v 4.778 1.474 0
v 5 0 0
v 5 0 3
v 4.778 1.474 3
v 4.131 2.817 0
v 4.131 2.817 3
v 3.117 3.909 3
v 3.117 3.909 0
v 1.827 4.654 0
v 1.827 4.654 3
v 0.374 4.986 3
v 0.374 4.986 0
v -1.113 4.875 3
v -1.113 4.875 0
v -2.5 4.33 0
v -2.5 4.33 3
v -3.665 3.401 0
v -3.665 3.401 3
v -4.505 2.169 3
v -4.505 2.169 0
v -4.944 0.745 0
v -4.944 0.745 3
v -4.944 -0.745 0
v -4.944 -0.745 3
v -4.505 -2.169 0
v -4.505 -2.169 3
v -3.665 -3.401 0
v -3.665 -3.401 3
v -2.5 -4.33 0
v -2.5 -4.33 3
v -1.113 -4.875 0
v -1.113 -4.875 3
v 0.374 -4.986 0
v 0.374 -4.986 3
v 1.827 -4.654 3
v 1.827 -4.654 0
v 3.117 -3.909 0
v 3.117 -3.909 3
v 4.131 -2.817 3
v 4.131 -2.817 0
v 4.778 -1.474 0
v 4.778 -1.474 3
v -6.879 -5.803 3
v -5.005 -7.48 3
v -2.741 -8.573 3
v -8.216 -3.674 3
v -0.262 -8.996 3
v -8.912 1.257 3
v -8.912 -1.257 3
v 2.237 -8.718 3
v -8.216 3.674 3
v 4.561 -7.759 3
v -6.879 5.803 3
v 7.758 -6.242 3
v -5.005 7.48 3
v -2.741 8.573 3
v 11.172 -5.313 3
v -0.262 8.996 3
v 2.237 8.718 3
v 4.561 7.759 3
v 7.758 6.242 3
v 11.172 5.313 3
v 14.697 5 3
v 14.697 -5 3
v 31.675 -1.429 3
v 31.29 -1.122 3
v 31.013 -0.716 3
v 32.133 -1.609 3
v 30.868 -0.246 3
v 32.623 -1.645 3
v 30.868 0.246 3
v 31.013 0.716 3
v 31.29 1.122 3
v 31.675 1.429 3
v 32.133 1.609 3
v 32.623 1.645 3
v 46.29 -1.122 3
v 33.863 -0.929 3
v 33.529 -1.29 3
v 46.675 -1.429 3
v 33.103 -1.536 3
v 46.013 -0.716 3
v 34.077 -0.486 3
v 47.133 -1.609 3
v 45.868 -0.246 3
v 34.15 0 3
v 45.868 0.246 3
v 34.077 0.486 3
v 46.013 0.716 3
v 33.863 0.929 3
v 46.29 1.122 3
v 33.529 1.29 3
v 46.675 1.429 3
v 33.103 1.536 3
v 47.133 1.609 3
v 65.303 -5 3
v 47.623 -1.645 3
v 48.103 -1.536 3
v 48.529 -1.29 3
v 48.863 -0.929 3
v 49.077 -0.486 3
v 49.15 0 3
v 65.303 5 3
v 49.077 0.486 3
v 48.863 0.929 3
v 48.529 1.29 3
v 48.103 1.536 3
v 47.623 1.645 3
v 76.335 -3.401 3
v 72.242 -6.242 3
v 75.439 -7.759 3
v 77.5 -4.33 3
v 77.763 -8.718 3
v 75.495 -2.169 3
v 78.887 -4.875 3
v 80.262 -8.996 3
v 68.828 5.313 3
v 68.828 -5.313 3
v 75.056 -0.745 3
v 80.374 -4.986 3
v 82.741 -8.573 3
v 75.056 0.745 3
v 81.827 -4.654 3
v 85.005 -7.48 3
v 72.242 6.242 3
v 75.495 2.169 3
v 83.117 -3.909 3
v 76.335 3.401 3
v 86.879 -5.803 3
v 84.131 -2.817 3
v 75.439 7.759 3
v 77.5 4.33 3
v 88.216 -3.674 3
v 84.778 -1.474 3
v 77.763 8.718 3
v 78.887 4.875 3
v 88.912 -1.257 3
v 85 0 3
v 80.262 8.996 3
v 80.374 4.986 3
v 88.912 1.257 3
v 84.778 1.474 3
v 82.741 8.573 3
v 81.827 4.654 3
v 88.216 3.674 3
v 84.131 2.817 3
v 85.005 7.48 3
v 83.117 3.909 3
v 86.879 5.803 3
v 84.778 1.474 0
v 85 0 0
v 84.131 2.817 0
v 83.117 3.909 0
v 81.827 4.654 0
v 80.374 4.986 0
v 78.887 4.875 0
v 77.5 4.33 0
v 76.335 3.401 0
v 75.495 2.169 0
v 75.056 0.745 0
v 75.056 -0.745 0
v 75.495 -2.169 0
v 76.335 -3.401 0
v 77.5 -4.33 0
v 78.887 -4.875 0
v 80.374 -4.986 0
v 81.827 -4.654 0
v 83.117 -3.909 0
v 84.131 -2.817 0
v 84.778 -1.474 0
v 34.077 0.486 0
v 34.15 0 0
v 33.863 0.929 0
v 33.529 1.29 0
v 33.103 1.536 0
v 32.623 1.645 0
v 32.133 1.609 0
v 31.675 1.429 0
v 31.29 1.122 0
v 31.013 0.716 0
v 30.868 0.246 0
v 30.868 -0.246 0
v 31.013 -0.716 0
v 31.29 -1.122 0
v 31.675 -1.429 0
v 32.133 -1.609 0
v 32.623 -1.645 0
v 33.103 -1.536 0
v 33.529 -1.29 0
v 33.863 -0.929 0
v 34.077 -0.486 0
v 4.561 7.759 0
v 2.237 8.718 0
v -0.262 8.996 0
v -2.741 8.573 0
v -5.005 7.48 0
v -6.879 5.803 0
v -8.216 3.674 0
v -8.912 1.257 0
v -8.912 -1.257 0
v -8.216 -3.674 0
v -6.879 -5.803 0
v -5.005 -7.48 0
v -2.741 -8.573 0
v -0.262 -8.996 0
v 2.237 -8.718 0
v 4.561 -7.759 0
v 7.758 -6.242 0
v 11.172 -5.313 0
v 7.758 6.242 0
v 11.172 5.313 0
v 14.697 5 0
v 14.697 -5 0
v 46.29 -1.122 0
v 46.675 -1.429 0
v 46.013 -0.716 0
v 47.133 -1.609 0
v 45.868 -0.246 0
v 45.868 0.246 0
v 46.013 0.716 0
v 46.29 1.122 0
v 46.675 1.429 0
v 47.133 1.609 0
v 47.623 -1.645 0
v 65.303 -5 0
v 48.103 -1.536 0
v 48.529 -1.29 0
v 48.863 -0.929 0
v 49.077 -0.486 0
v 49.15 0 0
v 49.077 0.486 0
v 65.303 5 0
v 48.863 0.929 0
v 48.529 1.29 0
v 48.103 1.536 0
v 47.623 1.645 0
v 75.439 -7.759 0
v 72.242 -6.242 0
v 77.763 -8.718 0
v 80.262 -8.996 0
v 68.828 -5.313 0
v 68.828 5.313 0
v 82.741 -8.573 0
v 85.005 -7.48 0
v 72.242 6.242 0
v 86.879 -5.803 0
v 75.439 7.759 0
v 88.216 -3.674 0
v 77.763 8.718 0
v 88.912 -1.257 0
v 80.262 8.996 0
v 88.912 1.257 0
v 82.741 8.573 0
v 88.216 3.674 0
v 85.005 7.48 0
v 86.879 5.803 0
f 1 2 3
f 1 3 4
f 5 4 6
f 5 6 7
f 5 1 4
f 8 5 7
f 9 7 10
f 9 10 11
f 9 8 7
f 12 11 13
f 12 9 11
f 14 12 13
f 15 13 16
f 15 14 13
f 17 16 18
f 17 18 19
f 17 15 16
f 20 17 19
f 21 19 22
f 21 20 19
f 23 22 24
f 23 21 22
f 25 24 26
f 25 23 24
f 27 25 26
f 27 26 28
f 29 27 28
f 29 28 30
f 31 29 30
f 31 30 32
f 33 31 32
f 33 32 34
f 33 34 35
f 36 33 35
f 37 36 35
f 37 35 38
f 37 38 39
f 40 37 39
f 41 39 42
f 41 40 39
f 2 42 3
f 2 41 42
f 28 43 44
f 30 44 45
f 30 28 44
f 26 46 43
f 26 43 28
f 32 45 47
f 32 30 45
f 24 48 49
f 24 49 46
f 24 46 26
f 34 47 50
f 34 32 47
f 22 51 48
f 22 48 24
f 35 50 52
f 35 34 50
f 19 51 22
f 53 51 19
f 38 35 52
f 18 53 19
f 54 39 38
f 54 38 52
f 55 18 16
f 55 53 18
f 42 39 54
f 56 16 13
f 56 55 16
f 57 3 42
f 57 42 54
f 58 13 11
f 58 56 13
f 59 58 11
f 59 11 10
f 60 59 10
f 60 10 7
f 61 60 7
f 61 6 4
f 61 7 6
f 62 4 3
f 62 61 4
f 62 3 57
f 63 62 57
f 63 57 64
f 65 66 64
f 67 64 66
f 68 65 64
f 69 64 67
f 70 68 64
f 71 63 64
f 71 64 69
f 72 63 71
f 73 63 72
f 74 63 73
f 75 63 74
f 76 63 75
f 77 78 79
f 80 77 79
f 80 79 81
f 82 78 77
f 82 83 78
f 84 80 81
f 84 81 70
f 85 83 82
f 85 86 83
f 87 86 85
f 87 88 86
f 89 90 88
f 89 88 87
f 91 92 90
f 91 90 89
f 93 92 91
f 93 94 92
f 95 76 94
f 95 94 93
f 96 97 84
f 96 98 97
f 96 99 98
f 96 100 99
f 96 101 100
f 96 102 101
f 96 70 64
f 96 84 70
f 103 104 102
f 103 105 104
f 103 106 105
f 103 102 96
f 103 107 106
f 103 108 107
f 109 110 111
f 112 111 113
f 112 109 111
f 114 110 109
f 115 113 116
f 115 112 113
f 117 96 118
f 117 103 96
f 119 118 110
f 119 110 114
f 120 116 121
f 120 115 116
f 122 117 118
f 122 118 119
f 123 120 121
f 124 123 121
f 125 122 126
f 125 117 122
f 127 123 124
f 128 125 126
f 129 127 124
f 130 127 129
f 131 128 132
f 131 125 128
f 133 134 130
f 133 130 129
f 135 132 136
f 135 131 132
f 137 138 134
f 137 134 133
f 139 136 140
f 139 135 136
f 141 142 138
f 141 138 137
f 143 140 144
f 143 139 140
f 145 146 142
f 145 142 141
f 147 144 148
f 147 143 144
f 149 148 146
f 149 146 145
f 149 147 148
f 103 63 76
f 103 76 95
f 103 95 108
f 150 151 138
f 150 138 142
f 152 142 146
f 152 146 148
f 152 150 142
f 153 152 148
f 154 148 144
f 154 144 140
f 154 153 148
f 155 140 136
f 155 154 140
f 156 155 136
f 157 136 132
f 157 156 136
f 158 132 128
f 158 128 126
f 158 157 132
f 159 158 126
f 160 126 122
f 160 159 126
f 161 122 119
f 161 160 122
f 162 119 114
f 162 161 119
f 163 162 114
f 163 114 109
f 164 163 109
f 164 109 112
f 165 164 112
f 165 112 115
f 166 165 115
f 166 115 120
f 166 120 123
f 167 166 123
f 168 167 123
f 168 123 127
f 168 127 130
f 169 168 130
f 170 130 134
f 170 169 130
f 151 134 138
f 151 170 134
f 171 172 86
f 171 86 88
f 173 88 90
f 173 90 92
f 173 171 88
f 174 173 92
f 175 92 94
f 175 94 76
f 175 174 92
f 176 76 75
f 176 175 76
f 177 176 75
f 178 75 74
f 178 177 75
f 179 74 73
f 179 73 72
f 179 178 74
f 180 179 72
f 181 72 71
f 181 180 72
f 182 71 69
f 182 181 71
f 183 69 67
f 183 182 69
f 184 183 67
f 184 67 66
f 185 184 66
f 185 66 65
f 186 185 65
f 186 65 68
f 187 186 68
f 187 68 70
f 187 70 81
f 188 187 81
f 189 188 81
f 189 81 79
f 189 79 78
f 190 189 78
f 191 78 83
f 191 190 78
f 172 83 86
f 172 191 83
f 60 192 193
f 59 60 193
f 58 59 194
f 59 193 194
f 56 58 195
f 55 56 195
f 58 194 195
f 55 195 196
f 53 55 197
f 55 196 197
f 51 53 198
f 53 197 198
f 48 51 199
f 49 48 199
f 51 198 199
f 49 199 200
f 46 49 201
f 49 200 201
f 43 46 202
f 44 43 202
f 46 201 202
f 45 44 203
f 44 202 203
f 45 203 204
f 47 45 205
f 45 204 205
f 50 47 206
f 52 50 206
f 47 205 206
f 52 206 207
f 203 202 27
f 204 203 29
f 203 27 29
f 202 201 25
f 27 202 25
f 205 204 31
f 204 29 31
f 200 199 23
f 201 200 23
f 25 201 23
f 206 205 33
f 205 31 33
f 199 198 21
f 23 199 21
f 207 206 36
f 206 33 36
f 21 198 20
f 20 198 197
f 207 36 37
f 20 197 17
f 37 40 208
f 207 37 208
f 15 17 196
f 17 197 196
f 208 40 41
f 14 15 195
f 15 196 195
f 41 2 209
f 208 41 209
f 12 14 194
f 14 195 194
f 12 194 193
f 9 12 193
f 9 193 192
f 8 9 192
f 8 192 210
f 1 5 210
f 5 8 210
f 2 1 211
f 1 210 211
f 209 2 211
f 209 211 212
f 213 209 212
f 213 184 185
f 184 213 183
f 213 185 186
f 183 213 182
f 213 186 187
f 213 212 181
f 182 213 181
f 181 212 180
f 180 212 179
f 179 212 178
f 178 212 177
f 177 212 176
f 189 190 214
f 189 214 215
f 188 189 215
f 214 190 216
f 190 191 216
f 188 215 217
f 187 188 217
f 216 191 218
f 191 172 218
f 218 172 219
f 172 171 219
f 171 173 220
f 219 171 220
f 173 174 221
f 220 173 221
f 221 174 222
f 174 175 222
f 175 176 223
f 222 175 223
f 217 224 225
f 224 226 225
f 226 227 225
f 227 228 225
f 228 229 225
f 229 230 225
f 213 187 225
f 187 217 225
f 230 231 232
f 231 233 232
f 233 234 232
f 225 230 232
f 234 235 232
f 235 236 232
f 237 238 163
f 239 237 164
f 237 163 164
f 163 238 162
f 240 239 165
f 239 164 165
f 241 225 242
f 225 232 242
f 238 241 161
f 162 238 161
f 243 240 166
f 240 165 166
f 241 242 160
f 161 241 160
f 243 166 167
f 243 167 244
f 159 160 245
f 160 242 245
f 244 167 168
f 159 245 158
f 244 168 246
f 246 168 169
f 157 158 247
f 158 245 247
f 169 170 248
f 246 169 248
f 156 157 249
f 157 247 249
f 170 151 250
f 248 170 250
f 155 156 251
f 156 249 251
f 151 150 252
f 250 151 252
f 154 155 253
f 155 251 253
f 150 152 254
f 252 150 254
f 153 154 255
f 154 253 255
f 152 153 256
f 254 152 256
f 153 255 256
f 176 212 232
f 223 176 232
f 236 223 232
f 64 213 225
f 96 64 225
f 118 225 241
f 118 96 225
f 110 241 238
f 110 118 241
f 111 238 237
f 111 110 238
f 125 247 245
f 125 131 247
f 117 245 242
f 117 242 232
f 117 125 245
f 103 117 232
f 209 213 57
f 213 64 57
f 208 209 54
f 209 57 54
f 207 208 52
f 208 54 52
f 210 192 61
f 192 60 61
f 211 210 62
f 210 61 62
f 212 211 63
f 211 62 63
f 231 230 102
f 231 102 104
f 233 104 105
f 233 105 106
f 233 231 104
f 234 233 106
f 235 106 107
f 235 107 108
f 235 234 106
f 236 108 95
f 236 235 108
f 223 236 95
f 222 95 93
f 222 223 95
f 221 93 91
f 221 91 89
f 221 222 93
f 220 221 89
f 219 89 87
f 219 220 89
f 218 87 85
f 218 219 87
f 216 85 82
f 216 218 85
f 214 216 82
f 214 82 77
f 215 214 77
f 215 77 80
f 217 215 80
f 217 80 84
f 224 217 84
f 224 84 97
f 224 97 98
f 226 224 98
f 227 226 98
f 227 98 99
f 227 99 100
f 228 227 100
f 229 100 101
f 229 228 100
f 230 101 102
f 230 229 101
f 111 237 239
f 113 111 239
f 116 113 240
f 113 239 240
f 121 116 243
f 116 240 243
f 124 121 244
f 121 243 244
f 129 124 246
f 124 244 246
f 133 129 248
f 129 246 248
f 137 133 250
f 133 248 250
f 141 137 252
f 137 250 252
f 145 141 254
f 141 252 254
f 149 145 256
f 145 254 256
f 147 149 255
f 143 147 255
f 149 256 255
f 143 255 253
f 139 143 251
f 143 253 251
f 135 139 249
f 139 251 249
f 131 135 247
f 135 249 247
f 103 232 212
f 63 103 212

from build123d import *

# Parameters (mm, degrees)
ESBO_O1_R                = 5
ESBO_O1_R_2              = 1.65
RESSALTO_EXTRUS_O1_DEPTH = 3
FILETE1_R                = 20


with BuildPart() as part:
    # Esboço1 → Ressalto-extrusão1 (new body)
    with BuildSketch(Plane.XY):
        with BuildLine():
            Line((7.483314774, -5), (72.516685226, -5))
            ThreePointArc((72.516685226, -5), (89, 0), (72.516685226, 5))
            Line((72.516685226, 5), (7.483314774, 5))
            ThreePointArc((7.483314774, 5), (-9, 0), (7.483314774, -5))
        make_face()
        Circle(ESBO_O1_R, mode=Mode.SUBTRACT)
        with Locations((32.5, 0)):
            Circle(ESBO_O1_R_2, mode=Mode.SUBTRACT)
        with Locations((47.5, 0)):
            Circle(ESBO_O1_R_2, mode=Mode.SUBTRACT)
        with Locations((80, 0)):
            Circle(ESBO_O1_R, mode=Mode.SUBTRACT)
    extrude(amount=RESSALTO_EXTRUS_O1_DEPTH)

    # Filete1
    filete1_edges = [part.edges().sort_by_distance(p)[0] for p in [
        (72.516685226, -5, 1.5),
        (7.483314774, -5, 1.5),
        (7.483314774, 5, 1.5),
        (72.516685226, 5, 1.5),
    ]]
    fillet(filete1_edges, radius=FILETE1_R)


solid = part.part
